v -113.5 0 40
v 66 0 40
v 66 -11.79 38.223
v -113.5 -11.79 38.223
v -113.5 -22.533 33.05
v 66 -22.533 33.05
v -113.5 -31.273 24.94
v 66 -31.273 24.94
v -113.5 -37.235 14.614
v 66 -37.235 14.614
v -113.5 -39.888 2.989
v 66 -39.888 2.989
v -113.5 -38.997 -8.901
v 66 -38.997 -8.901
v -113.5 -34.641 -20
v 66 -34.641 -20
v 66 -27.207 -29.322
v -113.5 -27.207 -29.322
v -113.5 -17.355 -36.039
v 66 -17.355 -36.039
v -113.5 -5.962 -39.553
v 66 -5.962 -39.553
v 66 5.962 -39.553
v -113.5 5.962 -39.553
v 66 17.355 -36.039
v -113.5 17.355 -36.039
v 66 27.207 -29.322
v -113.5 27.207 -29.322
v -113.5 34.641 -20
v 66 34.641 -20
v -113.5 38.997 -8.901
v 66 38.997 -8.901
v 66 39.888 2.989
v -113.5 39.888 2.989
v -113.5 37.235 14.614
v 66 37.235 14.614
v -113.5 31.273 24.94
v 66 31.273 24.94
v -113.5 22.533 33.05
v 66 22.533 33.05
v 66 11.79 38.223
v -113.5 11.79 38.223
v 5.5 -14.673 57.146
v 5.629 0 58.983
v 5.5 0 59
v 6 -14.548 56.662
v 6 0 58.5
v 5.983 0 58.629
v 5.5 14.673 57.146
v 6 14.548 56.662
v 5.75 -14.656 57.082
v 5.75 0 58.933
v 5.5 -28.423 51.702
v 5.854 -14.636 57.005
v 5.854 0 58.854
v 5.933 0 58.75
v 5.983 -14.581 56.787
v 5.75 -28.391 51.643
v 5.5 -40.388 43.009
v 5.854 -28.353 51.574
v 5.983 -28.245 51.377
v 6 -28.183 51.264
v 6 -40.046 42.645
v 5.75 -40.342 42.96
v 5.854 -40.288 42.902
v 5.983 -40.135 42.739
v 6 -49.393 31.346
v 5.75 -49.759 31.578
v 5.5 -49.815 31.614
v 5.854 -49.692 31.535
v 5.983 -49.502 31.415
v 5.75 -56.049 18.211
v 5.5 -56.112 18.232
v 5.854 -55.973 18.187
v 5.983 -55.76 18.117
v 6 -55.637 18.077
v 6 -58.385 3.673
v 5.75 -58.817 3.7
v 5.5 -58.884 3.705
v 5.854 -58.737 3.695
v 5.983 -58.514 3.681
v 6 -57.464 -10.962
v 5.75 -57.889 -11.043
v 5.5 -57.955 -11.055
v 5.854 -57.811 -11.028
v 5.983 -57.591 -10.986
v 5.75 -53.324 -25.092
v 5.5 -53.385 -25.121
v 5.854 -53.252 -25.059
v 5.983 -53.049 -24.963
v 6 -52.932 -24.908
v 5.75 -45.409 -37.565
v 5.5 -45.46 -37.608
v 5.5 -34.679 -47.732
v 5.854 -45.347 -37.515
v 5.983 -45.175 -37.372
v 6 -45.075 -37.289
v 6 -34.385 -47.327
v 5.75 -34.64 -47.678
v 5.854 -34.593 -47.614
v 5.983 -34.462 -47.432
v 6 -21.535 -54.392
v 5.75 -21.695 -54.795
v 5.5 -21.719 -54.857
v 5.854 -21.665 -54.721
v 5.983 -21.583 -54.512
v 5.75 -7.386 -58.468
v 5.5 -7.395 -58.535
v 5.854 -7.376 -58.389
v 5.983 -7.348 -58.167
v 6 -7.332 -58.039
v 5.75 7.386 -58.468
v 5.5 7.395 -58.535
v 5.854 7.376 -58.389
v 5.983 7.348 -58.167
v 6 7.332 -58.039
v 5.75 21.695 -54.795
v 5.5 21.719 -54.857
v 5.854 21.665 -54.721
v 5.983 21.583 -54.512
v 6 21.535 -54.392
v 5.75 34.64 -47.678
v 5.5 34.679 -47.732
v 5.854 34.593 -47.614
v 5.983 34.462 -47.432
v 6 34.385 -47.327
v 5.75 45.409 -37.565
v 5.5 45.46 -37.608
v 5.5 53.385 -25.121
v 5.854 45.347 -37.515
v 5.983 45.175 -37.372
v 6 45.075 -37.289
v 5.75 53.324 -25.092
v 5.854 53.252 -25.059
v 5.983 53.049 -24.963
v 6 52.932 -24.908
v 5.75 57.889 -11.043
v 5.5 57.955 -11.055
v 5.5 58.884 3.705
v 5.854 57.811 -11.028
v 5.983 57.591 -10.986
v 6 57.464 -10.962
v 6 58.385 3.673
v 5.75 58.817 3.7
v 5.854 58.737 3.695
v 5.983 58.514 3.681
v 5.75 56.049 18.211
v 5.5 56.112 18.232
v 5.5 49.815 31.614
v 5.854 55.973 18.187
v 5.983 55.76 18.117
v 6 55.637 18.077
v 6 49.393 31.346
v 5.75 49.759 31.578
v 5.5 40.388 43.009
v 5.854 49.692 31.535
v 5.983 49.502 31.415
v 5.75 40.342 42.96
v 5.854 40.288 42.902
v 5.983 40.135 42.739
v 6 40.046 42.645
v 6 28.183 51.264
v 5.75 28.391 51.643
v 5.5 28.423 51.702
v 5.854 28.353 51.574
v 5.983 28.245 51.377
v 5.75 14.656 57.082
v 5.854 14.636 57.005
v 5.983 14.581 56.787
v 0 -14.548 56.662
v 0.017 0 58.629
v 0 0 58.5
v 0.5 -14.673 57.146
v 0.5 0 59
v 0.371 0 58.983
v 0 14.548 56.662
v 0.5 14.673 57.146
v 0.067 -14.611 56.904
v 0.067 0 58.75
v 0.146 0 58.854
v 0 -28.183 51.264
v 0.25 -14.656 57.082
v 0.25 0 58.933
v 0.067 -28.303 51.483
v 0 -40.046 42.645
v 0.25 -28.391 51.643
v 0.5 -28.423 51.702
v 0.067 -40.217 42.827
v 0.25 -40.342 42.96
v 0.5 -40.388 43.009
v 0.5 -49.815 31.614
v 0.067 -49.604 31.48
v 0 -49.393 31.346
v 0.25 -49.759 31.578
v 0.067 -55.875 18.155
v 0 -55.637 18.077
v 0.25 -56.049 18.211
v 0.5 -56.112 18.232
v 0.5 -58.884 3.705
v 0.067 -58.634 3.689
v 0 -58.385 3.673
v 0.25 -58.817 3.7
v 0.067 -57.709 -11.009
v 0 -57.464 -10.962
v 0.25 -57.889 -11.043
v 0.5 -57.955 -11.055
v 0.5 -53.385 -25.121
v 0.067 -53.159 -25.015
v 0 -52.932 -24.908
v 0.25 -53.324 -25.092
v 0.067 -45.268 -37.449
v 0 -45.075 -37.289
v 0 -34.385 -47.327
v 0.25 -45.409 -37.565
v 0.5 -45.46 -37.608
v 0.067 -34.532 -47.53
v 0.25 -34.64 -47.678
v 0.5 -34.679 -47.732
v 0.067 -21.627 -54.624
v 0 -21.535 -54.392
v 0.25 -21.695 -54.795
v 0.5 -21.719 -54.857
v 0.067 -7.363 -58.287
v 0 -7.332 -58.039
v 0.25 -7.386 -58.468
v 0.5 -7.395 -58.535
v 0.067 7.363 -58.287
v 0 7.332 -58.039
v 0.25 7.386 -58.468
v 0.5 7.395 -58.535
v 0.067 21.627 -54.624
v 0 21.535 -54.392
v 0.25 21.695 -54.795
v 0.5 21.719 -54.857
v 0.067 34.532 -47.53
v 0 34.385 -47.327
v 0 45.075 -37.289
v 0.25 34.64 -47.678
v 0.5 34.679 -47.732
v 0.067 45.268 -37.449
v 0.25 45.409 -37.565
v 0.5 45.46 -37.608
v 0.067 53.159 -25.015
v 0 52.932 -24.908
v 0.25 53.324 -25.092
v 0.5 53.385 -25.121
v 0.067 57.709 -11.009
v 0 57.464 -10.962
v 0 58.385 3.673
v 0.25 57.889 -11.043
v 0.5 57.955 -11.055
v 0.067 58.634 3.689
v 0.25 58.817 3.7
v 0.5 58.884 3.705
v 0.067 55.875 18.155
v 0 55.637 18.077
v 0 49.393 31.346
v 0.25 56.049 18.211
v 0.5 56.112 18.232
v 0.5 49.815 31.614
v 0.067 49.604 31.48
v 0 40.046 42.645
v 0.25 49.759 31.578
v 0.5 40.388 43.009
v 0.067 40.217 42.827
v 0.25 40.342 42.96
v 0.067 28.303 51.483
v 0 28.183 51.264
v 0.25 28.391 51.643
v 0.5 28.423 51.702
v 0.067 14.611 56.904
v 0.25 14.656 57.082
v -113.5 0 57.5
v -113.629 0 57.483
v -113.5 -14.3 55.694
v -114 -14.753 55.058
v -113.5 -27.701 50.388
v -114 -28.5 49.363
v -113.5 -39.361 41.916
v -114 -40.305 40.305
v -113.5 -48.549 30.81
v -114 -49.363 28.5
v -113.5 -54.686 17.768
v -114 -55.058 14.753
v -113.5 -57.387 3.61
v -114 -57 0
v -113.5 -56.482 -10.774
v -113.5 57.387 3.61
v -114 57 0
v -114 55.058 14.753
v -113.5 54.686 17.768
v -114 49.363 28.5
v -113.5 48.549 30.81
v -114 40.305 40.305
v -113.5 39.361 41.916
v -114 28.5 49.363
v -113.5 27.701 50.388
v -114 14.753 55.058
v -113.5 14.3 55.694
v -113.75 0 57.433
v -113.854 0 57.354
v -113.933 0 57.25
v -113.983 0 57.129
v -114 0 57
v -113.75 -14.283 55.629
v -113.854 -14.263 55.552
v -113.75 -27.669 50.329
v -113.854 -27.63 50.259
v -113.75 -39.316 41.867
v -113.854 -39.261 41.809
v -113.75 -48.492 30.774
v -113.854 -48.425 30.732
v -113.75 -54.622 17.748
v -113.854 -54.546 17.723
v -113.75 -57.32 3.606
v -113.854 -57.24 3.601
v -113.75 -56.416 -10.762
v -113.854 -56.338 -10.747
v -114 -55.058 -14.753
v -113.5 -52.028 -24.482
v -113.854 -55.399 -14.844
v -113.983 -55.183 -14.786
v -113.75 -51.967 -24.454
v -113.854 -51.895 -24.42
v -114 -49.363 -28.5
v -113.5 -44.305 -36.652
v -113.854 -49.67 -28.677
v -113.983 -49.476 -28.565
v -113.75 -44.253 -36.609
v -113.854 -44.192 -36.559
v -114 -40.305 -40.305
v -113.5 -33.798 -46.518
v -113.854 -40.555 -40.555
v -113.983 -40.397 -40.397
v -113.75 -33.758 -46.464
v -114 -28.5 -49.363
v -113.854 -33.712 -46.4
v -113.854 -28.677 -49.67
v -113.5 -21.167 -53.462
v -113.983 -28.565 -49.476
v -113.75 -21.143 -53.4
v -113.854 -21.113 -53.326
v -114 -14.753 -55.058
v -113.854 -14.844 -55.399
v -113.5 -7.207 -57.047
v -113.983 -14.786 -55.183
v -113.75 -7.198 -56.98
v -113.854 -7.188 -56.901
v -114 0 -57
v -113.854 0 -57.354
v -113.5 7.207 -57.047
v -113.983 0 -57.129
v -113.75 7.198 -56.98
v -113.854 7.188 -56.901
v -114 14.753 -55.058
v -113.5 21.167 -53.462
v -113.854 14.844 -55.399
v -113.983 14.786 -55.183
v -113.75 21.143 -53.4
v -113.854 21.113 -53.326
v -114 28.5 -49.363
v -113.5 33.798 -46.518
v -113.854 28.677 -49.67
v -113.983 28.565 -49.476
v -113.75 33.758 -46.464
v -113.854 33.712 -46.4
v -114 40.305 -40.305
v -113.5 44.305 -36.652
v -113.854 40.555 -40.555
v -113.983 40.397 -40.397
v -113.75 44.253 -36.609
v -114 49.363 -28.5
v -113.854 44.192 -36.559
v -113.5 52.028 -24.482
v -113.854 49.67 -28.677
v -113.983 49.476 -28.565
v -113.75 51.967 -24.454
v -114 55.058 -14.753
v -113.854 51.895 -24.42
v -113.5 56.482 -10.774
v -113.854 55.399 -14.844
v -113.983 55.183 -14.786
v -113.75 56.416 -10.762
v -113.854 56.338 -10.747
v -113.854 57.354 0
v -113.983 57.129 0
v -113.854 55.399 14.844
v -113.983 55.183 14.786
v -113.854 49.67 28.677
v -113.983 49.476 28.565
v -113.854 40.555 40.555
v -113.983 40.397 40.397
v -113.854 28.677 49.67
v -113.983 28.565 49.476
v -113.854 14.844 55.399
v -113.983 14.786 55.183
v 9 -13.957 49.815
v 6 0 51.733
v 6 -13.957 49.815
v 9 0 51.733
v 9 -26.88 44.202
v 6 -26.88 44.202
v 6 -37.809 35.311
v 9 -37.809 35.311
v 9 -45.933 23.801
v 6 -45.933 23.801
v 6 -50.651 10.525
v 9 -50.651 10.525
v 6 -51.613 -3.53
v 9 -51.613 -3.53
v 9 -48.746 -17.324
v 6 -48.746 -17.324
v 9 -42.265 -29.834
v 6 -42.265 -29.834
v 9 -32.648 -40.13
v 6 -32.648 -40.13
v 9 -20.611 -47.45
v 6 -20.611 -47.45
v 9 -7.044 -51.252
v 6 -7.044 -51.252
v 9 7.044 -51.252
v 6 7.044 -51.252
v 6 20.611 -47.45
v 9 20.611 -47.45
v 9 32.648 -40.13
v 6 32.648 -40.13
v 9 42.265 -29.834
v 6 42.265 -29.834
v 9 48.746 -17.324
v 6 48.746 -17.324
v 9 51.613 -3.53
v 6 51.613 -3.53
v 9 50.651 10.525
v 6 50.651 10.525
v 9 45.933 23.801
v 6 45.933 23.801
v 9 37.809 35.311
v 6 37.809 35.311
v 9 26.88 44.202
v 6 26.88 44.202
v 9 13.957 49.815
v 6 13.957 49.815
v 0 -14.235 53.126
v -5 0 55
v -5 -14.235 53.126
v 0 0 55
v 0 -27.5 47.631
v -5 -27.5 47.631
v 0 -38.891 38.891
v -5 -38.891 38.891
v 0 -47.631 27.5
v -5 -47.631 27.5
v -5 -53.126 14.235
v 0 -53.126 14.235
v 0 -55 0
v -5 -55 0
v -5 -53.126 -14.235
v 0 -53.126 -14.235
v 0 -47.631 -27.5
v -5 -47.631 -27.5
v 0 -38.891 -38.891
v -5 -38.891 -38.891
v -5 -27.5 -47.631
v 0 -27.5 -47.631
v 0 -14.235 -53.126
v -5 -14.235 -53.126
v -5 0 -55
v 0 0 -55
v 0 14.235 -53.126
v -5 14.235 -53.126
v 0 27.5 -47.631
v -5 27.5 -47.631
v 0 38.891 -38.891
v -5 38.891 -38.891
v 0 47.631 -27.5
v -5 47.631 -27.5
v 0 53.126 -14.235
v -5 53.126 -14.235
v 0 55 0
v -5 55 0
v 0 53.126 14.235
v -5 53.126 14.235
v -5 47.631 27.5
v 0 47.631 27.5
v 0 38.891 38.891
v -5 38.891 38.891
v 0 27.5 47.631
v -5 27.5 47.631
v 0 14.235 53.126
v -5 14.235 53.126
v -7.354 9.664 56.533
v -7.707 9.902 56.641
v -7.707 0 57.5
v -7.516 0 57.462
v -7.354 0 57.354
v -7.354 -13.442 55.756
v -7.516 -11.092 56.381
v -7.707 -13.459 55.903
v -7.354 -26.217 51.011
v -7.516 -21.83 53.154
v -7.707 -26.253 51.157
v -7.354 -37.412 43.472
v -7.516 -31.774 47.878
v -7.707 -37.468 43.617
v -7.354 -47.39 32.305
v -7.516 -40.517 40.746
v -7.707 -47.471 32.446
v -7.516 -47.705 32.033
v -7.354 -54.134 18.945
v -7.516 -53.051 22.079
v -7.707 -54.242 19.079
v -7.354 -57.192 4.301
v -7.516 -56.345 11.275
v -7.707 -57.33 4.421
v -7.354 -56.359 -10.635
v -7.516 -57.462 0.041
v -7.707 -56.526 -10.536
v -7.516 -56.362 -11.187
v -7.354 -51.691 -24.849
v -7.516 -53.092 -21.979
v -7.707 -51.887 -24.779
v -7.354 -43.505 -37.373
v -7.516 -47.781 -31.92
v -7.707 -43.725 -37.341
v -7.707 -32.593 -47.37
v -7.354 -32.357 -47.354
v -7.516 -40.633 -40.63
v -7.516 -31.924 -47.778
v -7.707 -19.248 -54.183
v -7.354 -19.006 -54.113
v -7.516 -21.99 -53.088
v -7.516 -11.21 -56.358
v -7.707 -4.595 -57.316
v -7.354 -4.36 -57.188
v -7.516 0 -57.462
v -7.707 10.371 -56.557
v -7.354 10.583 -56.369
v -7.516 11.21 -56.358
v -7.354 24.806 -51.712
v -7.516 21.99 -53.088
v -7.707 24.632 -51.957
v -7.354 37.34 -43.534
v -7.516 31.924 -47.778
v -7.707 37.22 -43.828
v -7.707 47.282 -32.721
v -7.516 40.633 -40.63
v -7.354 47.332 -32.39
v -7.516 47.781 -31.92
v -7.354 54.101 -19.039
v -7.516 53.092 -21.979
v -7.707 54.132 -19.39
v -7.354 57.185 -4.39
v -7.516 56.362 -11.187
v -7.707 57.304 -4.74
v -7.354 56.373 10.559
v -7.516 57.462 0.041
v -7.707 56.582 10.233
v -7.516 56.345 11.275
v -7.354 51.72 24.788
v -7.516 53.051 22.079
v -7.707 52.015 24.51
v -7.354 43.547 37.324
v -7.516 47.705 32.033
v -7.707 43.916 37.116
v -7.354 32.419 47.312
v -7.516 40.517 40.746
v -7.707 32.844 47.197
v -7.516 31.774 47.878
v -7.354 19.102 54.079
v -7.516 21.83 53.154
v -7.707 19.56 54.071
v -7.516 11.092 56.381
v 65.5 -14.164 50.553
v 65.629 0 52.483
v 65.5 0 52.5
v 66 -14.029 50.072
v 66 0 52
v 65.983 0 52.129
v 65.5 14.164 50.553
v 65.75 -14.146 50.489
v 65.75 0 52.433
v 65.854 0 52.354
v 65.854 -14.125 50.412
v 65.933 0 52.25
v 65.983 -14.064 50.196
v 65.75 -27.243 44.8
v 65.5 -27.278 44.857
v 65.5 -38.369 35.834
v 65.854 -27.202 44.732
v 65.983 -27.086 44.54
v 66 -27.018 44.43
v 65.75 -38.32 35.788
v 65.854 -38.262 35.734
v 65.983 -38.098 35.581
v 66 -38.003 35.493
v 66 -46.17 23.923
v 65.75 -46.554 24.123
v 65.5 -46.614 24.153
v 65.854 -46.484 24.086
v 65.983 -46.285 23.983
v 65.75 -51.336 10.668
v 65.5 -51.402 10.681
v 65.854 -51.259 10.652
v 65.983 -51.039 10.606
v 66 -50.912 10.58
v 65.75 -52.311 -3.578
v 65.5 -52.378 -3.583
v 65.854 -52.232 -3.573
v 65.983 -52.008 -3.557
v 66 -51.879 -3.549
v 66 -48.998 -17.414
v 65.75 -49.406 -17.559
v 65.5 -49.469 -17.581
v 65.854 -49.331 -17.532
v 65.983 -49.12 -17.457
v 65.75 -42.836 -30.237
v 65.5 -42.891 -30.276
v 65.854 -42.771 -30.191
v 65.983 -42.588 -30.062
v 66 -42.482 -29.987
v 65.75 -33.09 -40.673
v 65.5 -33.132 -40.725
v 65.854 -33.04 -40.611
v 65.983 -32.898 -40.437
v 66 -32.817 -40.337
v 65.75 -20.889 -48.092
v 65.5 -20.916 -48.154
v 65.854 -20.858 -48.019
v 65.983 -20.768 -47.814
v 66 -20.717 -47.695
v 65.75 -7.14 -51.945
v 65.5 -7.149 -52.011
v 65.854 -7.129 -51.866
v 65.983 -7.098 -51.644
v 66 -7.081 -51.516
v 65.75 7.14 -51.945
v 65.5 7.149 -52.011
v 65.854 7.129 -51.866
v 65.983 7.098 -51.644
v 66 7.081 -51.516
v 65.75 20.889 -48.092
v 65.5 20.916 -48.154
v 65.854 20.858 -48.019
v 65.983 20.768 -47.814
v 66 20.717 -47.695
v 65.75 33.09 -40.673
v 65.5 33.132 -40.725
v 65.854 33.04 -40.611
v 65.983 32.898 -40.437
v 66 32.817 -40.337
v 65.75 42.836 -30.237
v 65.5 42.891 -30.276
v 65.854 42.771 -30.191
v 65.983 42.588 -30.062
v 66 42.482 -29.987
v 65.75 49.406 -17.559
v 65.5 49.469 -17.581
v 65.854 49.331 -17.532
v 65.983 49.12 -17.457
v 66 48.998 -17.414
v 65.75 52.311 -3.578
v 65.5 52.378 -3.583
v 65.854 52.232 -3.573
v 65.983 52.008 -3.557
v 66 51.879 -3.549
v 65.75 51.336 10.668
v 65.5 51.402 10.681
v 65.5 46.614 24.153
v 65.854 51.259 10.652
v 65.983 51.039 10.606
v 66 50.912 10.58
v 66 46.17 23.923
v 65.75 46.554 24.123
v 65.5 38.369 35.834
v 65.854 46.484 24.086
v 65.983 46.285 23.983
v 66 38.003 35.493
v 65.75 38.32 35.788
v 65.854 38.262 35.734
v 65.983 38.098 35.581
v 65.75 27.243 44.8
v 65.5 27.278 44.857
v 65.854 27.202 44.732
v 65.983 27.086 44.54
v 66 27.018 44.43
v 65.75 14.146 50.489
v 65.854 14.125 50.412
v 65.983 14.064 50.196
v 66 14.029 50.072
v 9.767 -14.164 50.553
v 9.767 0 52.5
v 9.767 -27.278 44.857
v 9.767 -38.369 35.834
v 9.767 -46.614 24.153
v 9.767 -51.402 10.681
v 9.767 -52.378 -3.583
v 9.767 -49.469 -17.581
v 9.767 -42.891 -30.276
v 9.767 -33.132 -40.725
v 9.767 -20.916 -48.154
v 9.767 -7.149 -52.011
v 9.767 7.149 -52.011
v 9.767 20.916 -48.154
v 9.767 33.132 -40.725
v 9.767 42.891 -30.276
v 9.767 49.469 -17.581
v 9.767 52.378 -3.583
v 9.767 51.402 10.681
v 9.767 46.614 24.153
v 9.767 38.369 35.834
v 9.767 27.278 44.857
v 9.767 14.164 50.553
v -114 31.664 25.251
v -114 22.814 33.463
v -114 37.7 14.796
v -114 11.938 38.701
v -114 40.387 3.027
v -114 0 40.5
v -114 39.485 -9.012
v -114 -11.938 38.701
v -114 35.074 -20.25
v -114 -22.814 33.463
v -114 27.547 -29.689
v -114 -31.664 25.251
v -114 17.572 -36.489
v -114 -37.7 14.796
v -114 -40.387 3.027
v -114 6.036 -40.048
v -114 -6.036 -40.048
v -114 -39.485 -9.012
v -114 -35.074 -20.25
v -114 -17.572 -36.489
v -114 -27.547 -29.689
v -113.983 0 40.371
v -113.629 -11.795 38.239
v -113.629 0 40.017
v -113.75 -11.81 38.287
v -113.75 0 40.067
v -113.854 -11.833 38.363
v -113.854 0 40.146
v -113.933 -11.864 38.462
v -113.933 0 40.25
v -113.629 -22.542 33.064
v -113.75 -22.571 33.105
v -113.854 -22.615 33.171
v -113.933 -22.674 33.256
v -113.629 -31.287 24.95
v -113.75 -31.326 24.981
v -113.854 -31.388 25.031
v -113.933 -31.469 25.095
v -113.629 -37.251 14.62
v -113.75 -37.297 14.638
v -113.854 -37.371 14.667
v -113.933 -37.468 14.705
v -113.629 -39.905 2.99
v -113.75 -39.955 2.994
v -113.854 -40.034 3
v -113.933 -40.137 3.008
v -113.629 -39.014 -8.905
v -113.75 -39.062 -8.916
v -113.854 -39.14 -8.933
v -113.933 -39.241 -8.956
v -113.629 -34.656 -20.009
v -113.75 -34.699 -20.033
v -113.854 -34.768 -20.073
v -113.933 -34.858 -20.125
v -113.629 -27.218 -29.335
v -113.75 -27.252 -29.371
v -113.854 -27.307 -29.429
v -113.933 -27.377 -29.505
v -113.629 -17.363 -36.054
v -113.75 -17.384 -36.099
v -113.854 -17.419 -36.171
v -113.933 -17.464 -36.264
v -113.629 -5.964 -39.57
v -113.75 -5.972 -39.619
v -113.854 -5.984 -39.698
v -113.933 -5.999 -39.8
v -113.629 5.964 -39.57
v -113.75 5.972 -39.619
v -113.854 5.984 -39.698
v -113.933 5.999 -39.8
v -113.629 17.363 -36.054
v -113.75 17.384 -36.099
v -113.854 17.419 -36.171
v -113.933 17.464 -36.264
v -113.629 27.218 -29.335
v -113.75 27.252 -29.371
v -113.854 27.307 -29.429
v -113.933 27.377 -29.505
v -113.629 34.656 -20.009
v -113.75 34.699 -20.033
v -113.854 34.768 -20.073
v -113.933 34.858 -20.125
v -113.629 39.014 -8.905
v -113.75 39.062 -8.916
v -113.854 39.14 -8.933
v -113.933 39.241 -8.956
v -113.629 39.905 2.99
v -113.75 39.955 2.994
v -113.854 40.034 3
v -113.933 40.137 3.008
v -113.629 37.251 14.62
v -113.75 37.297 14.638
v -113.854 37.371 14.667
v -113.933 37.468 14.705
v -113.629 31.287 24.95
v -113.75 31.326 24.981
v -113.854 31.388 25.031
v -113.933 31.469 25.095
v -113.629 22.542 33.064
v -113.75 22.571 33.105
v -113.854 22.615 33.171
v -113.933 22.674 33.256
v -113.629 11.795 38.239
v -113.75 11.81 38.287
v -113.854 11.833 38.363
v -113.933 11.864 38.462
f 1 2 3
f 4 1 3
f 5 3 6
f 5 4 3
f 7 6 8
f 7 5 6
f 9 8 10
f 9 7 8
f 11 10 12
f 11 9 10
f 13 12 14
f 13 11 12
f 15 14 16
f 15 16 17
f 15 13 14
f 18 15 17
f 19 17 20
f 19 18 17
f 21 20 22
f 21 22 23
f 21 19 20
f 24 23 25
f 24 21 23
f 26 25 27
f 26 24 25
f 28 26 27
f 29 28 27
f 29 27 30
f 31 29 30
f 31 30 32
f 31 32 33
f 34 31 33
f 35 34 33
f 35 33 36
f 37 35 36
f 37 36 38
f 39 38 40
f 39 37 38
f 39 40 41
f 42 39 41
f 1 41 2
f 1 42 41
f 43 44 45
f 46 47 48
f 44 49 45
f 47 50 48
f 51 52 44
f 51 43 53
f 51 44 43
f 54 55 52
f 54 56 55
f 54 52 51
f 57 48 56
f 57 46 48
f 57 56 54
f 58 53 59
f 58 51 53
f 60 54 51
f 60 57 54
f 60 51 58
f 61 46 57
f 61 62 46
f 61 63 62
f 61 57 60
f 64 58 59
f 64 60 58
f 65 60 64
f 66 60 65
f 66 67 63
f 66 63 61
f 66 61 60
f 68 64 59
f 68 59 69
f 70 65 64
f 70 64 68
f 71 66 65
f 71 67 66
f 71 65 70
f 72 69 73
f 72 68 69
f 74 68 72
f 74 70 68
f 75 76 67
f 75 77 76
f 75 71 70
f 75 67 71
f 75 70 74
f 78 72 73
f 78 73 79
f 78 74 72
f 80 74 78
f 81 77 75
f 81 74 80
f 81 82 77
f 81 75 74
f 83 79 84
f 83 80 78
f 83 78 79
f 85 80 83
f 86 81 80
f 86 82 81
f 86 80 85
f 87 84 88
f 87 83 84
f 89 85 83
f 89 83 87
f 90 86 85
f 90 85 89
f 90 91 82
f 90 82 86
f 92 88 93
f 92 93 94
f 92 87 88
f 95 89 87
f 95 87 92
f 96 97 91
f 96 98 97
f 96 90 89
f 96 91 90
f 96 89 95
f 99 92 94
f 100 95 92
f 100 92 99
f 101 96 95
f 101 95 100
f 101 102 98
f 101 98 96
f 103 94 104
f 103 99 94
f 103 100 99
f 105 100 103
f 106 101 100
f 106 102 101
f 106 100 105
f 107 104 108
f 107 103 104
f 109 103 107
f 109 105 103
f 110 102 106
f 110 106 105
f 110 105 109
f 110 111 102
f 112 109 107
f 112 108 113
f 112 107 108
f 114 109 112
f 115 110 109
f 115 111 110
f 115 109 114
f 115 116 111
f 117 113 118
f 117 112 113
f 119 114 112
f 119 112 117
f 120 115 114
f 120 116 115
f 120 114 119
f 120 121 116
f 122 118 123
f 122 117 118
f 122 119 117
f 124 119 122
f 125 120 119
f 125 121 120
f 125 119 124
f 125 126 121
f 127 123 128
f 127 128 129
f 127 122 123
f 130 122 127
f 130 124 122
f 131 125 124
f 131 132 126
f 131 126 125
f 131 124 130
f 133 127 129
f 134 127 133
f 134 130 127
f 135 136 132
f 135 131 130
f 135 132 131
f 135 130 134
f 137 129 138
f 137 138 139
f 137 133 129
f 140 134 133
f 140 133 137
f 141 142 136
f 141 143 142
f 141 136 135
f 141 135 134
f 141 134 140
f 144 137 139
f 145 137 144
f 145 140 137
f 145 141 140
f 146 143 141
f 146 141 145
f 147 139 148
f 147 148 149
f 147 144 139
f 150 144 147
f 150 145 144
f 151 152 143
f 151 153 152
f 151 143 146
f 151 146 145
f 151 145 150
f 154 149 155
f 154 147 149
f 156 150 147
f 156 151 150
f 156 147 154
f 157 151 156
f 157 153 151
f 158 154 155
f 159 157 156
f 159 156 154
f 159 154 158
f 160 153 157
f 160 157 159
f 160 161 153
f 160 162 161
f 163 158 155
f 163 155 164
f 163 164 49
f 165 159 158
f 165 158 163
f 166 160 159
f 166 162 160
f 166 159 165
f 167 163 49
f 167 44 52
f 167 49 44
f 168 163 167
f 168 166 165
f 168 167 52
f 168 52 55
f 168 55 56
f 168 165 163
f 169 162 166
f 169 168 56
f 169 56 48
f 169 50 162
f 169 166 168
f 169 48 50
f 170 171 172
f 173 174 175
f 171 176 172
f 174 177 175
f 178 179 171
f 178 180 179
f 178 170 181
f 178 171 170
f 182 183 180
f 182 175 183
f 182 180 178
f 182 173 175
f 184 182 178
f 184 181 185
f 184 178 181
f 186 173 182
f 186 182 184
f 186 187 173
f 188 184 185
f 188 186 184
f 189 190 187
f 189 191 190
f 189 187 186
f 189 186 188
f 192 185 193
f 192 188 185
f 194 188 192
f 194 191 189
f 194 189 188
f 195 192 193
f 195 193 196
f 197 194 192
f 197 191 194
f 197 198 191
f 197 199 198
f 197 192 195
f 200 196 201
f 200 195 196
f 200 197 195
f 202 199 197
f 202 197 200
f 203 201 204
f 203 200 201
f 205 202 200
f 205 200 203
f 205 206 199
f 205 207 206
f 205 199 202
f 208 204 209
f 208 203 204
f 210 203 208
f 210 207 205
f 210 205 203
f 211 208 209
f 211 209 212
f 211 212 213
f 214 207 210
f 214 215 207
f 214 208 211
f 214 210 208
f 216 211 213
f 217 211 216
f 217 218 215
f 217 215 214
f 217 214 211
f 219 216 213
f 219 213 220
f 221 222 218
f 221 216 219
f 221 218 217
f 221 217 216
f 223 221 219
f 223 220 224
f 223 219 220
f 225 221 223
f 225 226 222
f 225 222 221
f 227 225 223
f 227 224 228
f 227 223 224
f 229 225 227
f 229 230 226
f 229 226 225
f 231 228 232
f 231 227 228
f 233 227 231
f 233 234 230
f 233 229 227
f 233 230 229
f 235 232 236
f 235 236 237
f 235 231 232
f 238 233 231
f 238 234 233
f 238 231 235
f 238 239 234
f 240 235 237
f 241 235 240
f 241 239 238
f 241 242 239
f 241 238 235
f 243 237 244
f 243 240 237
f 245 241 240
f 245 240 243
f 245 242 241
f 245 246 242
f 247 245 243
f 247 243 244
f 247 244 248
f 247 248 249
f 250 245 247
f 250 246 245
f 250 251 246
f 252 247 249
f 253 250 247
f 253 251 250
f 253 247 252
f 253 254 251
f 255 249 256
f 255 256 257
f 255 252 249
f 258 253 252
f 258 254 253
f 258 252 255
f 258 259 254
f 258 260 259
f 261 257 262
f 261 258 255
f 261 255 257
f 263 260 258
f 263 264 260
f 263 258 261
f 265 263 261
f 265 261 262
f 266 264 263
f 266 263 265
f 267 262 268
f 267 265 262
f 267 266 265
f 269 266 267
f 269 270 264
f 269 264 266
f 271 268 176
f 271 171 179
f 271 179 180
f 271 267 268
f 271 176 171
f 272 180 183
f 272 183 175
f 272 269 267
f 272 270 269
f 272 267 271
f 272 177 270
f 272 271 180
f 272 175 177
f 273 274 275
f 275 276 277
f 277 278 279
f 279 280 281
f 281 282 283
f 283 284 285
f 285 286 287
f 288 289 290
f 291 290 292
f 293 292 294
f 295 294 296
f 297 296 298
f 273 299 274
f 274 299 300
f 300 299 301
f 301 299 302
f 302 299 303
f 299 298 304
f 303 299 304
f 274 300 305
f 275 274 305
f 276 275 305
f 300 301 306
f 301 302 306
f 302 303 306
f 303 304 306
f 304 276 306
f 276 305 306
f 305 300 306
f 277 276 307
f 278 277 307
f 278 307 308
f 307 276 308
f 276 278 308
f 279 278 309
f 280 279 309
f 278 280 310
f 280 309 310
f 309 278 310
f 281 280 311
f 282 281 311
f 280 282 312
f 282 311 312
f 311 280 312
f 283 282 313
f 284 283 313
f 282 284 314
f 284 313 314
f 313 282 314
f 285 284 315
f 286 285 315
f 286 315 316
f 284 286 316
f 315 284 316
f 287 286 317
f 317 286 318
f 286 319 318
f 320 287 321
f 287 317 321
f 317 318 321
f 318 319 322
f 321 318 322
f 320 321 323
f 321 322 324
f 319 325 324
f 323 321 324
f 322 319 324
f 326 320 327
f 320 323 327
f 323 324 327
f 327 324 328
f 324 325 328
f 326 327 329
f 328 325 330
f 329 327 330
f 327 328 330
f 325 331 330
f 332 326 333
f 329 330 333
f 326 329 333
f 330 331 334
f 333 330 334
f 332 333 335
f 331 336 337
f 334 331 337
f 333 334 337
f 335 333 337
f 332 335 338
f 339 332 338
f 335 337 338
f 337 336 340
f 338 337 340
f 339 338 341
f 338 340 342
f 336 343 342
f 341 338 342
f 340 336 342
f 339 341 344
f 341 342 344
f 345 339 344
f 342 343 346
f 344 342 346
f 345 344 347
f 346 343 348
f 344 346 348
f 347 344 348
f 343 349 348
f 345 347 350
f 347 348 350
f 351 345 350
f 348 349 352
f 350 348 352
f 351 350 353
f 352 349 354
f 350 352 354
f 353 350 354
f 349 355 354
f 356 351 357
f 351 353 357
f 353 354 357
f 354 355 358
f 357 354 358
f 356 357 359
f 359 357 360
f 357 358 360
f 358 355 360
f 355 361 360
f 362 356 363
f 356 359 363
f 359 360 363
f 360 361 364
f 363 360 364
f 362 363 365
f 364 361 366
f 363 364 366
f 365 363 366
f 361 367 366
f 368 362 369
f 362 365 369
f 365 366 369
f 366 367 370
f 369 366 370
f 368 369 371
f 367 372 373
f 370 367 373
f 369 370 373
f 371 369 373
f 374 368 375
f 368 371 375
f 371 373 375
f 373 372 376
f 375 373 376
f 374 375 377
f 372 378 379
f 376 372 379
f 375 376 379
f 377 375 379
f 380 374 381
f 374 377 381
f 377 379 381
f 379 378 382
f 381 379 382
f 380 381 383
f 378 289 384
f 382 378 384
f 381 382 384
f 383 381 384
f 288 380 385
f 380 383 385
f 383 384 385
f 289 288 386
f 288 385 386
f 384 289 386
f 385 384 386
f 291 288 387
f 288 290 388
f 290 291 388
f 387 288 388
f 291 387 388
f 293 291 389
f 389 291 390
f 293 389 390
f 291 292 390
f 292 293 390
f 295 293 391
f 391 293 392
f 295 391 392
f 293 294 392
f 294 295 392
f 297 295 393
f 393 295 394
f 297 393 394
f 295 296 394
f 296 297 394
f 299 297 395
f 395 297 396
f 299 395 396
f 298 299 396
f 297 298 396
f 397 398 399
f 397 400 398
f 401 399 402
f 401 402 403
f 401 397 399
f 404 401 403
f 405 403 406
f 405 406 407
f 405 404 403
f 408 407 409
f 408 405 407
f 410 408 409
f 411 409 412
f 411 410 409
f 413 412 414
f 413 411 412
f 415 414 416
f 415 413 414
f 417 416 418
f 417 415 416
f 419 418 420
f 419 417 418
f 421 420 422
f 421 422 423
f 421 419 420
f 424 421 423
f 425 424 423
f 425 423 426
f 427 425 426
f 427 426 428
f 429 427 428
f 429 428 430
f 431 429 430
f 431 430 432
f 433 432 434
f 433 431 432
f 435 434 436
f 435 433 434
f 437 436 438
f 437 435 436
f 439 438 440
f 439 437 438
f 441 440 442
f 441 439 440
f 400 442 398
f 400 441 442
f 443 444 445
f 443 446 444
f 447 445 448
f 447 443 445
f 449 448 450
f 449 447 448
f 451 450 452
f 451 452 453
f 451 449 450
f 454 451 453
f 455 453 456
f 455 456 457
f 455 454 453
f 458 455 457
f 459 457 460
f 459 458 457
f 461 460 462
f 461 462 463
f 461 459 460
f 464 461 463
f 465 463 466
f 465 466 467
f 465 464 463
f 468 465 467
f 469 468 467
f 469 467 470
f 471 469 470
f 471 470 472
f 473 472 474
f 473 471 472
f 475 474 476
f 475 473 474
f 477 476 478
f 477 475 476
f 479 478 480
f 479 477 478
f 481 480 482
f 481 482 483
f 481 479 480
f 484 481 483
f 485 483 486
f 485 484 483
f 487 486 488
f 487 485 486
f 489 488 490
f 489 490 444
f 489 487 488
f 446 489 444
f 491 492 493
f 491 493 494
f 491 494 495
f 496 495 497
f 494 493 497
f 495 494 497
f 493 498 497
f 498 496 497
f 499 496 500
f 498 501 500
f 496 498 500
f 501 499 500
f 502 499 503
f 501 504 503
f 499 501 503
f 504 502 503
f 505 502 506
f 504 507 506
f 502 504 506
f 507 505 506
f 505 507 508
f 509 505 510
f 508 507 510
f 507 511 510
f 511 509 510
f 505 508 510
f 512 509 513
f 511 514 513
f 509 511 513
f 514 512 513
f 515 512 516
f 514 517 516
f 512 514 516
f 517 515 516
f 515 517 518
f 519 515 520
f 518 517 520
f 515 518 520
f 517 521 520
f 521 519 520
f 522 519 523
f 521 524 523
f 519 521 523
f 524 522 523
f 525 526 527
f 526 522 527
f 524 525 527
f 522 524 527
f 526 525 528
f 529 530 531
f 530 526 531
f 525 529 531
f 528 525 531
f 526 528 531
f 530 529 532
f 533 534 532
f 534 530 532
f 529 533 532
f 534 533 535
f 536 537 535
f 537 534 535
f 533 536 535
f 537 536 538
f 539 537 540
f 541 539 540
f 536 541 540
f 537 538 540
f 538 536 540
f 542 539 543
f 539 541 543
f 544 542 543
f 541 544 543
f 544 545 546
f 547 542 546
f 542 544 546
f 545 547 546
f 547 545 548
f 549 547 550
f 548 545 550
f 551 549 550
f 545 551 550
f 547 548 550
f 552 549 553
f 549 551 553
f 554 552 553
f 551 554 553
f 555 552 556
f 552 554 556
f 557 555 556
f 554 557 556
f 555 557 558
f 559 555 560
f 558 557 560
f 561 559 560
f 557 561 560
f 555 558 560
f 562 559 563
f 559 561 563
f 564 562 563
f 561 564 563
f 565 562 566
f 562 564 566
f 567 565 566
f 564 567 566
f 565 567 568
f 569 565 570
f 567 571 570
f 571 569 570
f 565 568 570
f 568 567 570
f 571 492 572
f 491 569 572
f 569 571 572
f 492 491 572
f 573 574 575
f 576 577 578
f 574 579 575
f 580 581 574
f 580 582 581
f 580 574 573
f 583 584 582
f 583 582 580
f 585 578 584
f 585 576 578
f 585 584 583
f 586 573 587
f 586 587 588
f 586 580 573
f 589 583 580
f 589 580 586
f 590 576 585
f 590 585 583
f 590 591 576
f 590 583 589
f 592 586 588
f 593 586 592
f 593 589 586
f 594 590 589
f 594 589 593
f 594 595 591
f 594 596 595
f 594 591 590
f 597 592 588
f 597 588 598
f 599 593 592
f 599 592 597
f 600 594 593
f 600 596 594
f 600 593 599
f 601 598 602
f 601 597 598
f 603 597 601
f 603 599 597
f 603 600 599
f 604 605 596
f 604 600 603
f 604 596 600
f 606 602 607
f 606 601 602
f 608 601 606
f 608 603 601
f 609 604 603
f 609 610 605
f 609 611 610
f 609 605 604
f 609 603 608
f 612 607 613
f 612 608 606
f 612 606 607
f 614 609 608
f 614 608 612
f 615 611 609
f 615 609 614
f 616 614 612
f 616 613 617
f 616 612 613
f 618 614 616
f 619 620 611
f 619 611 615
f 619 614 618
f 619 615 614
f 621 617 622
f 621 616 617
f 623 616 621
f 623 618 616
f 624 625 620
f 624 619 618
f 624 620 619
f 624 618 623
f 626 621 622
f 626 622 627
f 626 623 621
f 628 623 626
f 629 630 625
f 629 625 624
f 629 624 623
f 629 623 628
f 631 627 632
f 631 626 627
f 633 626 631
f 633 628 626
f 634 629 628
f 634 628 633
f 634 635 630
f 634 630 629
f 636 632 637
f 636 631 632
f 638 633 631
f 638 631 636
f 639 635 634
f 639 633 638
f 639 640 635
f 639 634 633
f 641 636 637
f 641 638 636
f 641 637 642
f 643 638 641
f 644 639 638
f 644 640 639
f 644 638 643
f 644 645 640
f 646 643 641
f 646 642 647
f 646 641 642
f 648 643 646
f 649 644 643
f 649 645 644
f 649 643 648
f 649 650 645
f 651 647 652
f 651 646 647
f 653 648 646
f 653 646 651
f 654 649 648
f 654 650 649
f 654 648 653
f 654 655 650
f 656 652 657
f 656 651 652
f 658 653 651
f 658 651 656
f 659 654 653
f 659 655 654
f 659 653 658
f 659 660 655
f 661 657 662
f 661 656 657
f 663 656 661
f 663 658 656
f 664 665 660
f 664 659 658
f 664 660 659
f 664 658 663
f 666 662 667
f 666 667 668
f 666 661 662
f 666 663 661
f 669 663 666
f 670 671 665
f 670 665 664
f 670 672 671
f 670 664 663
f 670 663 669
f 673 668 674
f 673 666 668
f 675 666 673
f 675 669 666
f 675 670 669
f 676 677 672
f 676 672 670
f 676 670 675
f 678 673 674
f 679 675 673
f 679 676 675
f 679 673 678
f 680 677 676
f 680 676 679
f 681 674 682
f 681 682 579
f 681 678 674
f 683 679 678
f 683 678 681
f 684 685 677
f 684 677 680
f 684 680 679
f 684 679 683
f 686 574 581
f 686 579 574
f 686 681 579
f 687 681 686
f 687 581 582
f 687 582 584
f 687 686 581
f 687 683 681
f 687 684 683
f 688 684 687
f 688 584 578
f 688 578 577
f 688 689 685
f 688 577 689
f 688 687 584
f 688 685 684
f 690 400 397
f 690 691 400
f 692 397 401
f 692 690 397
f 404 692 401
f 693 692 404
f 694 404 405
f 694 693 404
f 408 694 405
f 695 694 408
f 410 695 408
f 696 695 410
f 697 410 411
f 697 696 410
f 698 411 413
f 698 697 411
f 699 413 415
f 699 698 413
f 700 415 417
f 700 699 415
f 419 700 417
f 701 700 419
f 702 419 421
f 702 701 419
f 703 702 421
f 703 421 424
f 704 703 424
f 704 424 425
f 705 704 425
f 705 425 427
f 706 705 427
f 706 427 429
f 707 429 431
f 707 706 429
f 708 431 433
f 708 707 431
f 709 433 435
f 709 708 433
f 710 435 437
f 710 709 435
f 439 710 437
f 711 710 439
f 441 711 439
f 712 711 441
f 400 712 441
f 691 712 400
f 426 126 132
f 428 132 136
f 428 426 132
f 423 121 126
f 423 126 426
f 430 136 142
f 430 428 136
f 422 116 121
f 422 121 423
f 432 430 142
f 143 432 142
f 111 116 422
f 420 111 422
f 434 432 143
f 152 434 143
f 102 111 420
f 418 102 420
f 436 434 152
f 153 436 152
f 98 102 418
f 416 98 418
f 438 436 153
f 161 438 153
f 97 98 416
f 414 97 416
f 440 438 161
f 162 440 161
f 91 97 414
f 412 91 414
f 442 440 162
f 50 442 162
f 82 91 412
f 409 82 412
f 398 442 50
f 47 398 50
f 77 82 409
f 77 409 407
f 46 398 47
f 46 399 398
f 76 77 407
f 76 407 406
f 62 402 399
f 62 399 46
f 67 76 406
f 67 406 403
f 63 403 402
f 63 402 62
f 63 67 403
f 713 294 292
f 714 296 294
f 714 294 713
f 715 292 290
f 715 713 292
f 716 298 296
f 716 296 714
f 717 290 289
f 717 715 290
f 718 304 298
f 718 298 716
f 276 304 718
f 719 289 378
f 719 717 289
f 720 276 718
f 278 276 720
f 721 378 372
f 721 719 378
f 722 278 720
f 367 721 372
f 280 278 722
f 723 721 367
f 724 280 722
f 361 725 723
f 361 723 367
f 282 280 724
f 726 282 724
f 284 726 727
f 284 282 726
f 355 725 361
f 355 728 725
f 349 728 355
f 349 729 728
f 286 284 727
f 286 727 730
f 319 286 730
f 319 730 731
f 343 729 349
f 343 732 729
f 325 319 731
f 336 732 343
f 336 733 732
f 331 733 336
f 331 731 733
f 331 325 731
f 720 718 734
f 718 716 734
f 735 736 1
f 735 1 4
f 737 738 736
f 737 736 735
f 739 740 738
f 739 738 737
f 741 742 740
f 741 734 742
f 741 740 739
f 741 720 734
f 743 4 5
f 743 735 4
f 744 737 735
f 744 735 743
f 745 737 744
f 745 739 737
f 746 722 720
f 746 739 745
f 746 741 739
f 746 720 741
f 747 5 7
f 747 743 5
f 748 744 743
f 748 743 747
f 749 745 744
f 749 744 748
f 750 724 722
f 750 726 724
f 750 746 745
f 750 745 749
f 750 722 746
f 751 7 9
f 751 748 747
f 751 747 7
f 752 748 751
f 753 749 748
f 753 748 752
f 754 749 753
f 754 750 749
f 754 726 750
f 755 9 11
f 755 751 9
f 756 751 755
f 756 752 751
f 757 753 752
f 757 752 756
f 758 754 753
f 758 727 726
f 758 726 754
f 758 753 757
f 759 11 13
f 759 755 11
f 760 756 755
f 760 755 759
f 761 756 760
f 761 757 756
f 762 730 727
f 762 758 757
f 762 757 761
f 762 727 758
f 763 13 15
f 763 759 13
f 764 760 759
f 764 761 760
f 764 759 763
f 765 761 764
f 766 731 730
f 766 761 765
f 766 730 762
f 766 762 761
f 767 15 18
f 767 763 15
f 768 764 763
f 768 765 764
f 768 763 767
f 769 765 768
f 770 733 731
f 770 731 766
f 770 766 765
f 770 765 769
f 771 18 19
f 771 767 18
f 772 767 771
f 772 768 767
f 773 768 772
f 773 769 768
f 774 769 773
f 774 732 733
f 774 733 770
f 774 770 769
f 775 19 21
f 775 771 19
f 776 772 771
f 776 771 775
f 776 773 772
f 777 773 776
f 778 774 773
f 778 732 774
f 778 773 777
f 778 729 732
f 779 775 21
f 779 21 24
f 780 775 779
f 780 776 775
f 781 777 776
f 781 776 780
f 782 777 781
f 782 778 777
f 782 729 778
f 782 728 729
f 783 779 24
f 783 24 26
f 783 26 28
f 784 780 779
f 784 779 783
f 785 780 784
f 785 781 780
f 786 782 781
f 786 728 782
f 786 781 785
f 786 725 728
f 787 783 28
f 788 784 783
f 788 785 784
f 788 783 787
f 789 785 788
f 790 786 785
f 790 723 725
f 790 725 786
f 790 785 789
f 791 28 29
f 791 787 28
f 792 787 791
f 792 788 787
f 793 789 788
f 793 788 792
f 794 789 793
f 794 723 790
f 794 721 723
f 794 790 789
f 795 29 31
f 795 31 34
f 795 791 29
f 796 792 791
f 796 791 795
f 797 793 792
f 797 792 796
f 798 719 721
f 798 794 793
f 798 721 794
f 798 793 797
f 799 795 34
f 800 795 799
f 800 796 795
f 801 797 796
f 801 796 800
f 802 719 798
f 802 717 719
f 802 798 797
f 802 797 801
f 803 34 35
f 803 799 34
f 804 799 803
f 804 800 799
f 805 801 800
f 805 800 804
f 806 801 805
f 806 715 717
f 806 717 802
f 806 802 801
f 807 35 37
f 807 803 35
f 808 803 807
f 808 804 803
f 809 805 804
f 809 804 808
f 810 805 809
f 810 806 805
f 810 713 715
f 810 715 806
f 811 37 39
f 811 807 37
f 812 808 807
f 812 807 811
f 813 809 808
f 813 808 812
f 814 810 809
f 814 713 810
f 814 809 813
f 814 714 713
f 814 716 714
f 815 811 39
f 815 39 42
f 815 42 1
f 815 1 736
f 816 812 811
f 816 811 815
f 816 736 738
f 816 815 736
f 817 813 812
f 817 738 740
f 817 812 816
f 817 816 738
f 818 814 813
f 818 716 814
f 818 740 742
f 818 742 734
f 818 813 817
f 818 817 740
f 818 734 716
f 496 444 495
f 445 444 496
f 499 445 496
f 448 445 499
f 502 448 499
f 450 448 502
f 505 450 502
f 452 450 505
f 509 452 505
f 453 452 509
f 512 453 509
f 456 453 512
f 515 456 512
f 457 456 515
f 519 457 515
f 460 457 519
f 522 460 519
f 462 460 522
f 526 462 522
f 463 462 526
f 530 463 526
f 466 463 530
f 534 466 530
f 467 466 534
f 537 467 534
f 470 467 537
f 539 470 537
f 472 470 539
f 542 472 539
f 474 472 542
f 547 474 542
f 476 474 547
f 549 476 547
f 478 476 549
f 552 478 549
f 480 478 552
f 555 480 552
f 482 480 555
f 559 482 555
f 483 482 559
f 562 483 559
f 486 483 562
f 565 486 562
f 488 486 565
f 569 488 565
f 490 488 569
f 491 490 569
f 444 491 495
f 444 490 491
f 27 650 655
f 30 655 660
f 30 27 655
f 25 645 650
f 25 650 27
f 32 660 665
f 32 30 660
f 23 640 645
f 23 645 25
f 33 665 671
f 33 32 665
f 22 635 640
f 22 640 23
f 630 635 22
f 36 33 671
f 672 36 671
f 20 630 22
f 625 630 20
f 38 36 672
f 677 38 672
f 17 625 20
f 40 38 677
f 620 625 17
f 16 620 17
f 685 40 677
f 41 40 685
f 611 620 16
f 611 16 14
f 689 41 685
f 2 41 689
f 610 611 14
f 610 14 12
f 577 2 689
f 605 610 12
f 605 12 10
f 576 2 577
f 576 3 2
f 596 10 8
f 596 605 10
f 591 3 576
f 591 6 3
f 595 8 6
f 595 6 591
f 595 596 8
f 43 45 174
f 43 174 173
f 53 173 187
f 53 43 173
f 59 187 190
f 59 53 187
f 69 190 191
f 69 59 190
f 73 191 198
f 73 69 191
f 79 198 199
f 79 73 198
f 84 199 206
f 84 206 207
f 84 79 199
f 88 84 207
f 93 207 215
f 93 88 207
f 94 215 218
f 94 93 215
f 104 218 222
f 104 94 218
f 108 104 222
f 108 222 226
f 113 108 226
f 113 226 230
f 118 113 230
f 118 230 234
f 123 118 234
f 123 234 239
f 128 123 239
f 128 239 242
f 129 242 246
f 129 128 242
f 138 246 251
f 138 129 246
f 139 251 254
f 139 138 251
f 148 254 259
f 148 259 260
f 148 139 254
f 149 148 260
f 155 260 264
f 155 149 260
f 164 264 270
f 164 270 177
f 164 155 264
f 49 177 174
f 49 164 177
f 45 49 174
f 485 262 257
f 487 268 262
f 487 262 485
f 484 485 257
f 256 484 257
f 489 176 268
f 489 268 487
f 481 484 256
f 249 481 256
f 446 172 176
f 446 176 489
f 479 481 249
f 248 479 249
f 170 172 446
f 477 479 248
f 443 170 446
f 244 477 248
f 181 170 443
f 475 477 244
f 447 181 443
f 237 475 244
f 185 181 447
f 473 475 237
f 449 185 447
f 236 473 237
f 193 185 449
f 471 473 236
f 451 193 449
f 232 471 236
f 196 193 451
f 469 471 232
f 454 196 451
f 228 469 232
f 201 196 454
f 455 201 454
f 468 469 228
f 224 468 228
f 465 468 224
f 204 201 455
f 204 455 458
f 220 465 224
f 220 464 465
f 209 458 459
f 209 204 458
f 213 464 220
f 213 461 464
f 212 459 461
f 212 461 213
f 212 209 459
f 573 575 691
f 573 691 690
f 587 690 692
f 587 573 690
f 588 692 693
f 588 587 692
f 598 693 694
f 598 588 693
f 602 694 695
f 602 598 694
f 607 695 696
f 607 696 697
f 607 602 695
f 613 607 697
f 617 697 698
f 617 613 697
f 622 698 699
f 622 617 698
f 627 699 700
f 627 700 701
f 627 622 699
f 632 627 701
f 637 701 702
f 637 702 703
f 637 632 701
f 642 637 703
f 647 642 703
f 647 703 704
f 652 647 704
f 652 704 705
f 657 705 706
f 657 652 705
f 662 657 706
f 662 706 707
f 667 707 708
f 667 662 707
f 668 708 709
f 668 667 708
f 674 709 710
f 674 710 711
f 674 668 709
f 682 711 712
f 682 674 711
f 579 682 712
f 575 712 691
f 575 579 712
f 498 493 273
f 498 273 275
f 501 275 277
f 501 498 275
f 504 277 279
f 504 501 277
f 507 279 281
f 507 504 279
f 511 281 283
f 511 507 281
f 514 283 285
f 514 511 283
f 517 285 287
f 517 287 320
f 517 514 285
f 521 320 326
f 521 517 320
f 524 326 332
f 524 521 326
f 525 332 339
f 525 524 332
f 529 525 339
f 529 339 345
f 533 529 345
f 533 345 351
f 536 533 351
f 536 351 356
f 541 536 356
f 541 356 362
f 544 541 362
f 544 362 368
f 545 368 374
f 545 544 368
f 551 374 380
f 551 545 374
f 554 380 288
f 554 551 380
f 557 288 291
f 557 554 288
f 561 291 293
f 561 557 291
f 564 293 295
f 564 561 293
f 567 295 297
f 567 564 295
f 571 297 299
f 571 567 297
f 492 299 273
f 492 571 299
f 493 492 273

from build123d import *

# Parameters (mm, degrees)
FILLET1_R = 0.5


with BuildPart() as part:
    # Sketch1 → Base-Revolve (revolve)
    with BuildSketch(Plane.XY, mode=Mode.PRIVATE) as base_revolve_sk:
        Polygon((-114, -57.5), (-7.5, -57.5), (-5, -55), (0, -55), (0, -59), (6, -59), (6, -51.733365662), (9, -51.733365662), (9.766634338, -52.5), (66, -52.5), (66, -40), (-114, -40), align=None)
    revolve(base_revolve_sk.sketch.rotate(Axis((-138.758229417, 0, 0), (1, 0, 0)), 270), axis=Axis((-138.758229417, 0, 0), (1, 0, 0)))

    # Fillet1
    fillet1_edges = [part.edges().sort_by_distance(p)[0] for p in [
        (6, 0, -59),
        (0, 0, -59),
        (-7.5, 0, -57.5),
        (-114, 0, -57.5),
        (-114, 0, -40),
        (66, 0, -52.5),
    ]]
    fillet(fillet1_edges, radius=FILLET1_R)


solid = part.part
